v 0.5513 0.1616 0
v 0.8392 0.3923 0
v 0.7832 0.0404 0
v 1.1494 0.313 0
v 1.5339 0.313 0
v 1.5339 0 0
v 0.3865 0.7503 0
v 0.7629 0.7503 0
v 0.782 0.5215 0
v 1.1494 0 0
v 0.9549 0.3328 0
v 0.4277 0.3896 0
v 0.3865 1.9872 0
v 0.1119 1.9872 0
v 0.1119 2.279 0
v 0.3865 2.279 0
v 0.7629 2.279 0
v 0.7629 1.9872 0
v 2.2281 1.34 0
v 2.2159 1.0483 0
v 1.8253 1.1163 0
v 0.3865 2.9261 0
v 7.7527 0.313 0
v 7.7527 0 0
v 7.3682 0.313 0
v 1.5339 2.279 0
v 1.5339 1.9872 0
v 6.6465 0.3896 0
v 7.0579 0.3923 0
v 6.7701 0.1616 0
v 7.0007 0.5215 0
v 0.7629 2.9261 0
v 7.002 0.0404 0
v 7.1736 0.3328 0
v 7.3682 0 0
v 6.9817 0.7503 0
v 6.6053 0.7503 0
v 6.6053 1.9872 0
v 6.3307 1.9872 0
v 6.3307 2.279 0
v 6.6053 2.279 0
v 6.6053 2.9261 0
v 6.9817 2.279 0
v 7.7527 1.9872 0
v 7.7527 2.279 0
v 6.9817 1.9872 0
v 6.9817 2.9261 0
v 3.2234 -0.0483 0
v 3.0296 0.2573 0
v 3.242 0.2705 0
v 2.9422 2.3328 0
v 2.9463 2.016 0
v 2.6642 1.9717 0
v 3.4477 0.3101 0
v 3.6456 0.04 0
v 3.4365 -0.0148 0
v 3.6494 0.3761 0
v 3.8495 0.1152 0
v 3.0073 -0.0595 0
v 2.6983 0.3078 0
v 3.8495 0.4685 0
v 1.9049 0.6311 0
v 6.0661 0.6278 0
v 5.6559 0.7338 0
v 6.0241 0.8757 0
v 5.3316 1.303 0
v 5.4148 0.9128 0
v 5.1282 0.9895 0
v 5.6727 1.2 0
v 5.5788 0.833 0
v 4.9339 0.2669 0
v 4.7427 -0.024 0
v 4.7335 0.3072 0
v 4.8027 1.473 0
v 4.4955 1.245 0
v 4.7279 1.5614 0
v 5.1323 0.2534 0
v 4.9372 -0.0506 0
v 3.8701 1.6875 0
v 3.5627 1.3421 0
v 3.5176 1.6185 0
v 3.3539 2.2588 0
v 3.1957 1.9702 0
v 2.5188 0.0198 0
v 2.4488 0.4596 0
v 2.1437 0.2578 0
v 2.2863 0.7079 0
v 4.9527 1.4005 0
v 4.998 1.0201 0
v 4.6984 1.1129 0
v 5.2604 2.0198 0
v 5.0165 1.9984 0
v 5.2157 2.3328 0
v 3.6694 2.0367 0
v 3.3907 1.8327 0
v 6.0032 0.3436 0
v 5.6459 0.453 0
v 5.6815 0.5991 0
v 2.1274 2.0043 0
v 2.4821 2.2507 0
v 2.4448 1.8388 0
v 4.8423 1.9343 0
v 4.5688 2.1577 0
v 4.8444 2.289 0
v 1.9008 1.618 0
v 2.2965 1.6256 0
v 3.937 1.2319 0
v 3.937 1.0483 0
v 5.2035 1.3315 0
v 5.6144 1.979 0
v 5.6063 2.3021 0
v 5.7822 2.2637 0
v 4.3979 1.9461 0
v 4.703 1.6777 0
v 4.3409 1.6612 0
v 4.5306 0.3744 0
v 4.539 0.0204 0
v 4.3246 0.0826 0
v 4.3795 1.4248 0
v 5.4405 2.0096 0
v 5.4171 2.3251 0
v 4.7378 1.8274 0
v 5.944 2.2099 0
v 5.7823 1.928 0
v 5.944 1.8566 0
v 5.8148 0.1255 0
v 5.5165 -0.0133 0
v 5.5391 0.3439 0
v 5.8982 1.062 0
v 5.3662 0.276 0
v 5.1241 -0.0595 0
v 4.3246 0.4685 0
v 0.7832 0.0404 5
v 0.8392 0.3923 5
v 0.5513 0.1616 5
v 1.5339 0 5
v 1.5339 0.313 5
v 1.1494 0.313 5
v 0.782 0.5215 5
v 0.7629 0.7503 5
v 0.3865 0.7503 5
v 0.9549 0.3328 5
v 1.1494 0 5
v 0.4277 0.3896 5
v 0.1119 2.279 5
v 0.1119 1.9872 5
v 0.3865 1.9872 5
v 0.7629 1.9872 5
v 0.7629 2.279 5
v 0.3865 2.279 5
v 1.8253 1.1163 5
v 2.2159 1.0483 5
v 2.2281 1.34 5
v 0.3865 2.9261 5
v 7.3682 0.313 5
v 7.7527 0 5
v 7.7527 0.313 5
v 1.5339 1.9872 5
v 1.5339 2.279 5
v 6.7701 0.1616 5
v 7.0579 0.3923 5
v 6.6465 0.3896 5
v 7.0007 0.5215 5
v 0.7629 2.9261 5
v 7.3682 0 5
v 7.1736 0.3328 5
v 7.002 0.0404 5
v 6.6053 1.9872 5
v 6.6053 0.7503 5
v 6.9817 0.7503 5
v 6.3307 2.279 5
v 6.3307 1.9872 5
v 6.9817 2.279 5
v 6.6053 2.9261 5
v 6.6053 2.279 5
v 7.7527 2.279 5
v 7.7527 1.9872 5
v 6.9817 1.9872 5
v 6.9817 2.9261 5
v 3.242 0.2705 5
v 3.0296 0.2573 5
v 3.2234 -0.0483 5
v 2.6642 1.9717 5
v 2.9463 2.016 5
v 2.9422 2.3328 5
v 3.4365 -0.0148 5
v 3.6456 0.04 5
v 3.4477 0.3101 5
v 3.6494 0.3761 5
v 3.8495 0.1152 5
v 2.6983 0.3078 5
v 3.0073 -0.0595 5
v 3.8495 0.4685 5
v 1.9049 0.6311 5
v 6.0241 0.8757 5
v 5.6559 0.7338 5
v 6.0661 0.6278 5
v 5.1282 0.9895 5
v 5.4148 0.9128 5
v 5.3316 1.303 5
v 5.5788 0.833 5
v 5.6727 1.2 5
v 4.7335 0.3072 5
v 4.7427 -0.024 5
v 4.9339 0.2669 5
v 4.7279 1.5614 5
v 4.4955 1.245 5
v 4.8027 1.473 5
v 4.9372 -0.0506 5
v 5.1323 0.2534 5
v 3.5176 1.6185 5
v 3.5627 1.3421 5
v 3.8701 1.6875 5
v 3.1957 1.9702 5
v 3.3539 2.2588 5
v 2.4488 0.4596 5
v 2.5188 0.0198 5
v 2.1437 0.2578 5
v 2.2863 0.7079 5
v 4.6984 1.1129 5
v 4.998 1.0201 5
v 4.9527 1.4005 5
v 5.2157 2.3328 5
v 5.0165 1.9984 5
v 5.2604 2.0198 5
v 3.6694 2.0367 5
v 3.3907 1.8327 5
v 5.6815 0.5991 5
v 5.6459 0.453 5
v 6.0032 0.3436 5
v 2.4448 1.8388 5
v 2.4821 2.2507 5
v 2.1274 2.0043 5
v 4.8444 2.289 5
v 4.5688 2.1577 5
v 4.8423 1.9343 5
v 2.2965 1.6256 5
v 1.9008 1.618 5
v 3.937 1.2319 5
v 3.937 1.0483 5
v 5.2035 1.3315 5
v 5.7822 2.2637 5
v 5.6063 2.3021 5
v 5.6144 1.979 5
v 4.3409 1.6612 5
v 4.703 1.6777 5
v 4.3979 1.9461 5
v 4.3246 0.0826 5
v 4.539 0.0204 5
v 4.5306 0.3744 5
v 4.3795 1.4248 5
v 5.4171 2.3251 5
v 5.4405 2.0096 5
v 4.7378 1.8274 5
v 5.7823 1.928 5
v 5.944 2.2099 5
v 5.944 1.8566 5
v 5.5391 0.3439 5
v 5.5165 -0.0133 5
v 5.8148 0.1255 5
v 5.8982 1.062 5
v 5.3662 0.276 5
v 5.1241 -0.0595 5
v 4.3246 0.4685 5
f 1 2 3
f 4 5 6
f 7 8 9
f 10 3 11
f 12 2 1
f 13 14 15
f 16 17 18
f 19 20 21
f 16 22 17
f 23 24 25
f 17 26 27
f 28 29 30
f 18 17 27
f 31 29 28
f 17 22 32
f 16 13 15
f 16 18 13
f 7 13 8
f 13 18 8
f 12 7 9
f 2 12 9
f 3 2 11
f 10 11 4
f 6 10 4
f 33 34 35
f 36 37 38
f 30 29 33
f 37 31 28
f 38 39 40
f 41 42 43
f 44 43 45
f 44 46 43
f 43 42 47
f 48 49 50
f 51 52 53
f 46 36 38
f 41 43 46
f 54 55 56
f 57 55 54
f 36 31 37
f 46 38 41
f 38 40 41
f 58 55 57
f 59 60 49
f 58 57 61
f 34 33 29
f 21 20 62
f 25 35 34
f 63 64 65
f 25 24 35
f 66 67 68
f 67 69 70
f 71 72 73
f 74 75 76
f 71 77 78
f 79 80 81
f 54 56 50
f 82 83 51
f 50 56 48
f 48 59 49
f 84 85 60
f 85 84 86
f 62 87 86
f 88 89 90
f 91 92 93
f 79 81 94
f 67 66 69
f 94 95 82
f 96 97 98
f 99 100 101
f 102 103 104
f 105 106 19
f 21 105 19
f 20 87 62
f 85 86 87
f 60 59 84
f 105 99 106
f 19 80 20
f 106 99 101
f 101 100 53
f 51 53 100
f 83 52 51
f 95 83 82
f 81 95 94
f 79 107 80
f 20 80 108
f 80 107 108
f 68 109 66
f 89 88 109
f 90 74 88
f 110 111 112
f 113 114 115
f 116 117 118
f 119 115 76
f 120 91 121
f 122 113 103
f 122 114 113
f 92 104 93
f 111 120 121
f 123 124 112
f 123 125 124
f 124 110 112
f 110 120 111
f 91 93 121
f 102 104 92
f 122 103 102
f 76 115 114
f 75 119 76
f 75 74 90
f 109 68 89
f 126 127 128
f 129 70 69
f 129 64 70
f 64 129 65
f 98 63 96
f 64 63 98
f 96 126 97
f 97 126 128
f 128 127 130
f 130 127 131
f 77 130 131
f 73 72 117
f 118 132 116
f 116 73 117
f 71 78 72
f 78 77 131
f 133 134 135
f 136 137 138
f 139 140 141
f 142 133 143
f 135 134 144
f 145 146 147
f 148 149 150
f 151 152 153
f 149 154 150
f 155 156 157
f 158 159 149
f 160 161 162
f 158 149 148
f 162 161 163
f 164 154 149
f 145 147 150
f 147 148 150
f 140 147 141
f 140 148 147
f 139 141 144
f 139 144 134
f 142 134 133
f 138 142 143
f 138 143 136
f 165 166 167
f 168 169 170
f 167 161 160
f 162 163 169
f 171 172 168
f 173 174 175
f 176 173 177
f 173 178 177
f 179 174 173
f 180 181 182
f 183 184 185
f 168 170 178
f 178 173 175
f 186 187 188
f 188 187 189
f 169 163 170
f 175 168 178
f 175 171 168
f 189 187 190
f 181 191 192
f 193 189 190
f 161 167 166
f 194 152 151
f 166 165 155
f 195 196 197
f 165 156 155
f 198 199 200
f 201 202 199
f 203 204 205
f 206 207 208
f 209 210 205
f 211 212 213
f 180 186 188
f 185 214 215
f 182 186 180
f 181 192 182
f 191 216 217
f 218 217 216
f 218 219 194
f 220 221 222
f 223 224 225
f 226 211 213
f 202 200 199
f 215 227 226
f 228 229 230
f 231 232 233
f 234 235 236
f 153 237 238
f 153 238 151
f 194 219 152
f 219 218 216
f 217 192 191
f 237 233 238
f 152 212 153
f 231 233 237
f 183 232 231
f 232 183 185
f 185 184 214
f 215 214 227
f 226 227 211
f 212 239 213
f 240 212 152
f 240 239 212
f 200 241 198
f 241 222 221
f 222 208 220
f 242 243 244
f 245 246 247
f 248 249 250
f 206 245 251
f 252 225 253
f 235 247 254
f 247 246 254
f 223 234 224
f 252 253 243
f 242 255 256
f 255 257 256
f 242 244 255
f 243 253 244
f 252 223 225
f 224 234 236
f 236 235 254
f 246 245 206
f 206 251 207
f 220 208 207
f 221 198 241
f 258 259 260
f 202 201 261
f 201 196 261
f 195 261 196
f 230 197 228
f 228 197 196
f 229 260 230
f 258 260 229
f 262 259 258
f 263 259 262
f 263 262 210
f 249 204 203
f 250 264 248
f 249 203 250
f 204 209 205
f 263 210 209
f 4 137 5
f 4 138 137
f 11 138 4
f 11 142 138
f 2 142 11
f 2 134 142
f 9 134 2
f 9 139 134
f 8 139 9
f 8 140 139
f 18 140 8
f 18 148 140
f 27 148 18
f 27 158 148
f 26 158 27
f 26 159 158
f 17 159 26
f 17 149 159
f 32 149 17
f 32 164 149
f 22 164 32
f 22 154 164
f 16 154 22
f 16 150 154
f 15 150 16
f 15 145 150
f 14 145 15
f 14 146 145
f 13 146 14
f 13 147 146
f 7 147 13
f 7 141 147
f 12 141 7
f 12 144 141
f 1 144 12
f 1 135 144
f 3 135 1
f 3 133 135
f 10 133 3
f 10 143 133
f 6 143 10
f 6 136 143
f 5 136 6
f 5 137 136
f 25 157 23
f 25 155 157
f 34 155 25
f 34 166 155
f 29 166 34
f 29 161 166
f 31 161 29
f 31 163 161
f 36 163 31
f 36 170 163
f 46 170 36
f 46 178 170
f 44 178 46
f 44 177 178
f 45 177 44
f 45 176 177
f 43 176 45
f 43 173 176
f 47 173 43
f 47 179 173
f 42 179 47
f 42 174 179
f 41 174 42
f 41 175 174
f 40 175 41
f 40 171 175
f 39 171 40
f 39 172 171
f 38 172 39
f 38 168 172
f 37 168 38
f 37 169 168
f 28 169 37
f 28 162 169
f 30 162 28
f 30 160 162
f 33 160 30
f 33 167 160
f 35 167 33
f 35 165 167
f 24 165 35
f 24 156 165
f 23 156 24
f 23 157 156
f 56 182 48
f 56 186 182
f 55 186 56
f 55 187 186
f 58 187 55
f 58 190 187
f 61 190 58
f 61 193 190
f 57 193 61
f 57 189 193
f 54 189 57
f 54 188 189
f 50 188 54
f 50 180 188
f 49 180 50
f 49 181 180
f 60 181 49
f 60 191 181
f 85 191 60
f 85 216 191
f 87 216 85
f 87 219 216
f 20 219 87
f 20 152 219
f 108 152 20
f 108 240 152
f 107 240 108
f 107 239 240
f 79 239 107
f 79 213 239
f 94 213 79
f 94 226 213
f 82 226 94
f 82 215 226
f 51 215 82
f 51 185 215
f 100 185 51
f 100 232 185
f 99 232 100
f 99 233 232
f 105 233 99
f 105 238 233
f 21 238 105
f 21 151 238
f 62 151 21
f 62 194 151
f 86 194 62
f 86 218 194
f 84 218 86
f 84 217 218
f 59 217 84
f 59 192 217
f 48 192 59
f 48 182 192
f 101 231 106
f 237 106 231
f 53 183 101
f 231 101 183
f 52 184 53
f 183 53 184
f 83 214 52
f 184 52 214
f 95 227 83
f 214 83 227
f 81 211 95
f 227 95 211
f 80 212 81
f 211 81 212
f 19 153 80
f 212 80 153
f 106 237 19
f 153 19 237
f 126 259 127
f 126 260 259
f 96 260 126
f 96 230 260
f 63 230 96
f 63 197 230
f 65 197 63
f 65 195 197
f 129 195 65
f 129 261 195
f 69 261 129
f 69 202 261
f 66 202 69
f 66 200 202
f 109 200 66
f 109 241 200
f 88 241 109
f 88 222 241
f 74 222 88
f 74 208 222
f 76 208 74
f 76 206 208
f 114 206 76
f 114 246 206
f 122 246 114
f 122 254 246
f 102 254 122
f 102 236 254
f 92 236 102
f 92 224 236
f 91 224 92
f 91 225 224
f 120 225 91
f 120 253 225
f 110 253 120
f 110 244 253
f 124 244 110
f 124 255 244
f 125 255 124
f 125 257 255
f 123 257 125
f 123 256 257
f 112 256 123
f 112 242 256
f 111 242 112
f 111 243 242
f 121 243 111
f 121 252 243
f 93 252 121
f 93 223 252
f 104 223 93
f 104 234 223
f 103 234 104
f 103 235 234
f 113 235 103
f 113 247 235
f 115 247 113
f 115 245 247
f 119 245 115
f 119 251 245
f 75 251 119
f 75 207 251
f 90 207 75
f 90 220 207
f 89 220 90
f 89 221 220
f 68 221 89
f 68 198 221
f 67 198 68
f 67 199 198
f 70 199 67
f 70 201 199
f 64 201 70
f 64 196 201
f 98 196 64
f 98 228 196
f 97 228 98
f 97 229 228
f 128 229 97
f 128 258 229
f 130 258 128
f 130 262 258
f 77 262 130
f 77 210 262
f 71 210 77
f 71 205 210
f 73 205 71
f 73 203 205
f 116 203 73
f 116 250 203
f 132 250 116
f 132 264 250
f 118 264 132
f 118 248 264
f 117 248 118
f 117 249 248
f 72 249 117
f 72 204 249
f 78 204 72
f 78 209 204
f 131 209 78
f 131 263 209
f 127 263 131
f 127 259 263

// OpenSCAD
texte_a_inserer = "test"; 
taille = 3; 
police = "Acme"; //[[Abril Fatface,Aclonica,Acme,Advent Pro,Akronim,Aladin,Alegreya,Alegreya Sans,Alegreya SC,Alex Brush,Alfa Slab One,Alice,Amaranth,Architects Daughter,Archivo Black,Archivo Narrow,Arimo,Arvo,Asap,Astloch,Asul,Averia Libre,Averia Serif Libre,Bangers,Basic,Belgrano,Berkshire Swash,Bigshot One,Bilbo Swash Caps,Black Ops One,Bonbon,Bowlby One SC,Brawler,Bubblegum Sans,Butterfly Kids,Cabin Condensed,Caesar Dressing,Cagliostro,Calligraffitti,Capriola,Carter One,Changa One,Chango,Chelsea Market,Cherry Cream Soda,Chewy,Chicle,Chivo,Clicker Script,Coming Soon,Concert One,Condiment,Cookie,Courgette,Covered By Your Grace,Crimson Text,Dancing Script,DejaVu Sans,DejaVu Serif,Dhurjati,Doppio One,Dosis,Droid Sans,Eagle Lake,Electrolize,Emilys Candy,Encode Sans,Encode Sans Compressed,Euphoria Script,Exo,Exo 2,Faster One,Federo,Finger Paint,Fjord One,Fontdiner Swanky,Freckle Face,Fruktur,Gabriela,Geo,Germania One,Give You Glory,Gloria Hallelujah,Goudy Bookletter 1911,Graduate,Grand Hotel,Great Vibes,Griffy,Hanalei Fill,Happy Monkey,Henny Penny,Hind,IM Fell English SC,Indie Flower,Irish Grover,Italianno,Jacques Francois Shadow,Jolly Lodger,Josefin Slab,Joti One,Judson,Just Another Hand,Kalam,Kameron,Karma,Kavoon,Knewave,Kranky,Kristi,Laila,Lakki Reddy,Lancelot,Lato,Leckerli One,Ledger,Lekton,Lemon One,Liberation Sans,Libre Caslon Text,Life Savers,Lilita One,Lily Script One,Limelight,Lobster,Lobster Two,Londrina Outline,Londrina Shadow,Londrina Solid,Lora,Love Ya Like A Sister,Loved by the King,Lovers Quarrel,Luckiest Guy,Lusitana,Macondo,Macondo Swash Caps,Mako,Marck Script,Margarine,Marko One,Maven Pro,McLaren,MedievalSharp,Merienda One,Merriweather,Mervale Script,Metal Mania,Metrophobic,Milonga,Miltonian Tattoo,Miss Fajardose,Molle,Montez,Montserrat,Mr De Haviland,Mystery Quest,Neucha,New Rocker,Niconne,Nosifer,Nothing You Could Do,Noto Sans Oriya,Noto Serif,Nova Square,Nunito,Old Standard TT,Oleo Script,Oleo Script Swash Caps,Orbitron,Oregano,Orienta,Original Surfer,Oswald,Over the Rainbow,Overlock,Oxygen,Pacifico,Paprika,Parisienne,Patrick Hand SC,Paytone One,Peralta,Permanent Marker,Piedra,Pirata One,Play,Playball,Poetsen One,Poppins,Press Start 2P,Princess Sofia,PT Mono,Qwigley,Racing Sans One,Raleway,Rancho,Ranga,Ribeye,Roboto,Roboto Condensed,Roboto Slab,Rochester,Rock Salt,Rubik One,Sail,Salsa,Sansita One,Sarina,Satisfy,Schoolbell,Seaweed Script,Sevillana,Shadows Into Light,Shadows Into Light Two,Share,Six Caps,Skranji,Source Sans Pro,Spicy Rice,Stardos Stencil,Stoke,Syncopate,Teko,Terminal Dosis,The Girl Next Door,Tillana,Timmana,Titillium Web,Ubuntu,Ultra,Underdog,UnifrakturCook,UnifrakturMaguntia,Vampiro One,Vidaloka,Viga,Voces,Volkhov,Vollkorn,Voltaire,Waiting for the Sunrise,Wallpoet,Wellfleet,Wendy One,Yellowtail,Yesteryear,Zeyada]]
hauteur = 5; 
module rendu(){
linear_extrude(hauteur) text(texte_a_inserer,size = taille, font = police);
}
rendu();
 
